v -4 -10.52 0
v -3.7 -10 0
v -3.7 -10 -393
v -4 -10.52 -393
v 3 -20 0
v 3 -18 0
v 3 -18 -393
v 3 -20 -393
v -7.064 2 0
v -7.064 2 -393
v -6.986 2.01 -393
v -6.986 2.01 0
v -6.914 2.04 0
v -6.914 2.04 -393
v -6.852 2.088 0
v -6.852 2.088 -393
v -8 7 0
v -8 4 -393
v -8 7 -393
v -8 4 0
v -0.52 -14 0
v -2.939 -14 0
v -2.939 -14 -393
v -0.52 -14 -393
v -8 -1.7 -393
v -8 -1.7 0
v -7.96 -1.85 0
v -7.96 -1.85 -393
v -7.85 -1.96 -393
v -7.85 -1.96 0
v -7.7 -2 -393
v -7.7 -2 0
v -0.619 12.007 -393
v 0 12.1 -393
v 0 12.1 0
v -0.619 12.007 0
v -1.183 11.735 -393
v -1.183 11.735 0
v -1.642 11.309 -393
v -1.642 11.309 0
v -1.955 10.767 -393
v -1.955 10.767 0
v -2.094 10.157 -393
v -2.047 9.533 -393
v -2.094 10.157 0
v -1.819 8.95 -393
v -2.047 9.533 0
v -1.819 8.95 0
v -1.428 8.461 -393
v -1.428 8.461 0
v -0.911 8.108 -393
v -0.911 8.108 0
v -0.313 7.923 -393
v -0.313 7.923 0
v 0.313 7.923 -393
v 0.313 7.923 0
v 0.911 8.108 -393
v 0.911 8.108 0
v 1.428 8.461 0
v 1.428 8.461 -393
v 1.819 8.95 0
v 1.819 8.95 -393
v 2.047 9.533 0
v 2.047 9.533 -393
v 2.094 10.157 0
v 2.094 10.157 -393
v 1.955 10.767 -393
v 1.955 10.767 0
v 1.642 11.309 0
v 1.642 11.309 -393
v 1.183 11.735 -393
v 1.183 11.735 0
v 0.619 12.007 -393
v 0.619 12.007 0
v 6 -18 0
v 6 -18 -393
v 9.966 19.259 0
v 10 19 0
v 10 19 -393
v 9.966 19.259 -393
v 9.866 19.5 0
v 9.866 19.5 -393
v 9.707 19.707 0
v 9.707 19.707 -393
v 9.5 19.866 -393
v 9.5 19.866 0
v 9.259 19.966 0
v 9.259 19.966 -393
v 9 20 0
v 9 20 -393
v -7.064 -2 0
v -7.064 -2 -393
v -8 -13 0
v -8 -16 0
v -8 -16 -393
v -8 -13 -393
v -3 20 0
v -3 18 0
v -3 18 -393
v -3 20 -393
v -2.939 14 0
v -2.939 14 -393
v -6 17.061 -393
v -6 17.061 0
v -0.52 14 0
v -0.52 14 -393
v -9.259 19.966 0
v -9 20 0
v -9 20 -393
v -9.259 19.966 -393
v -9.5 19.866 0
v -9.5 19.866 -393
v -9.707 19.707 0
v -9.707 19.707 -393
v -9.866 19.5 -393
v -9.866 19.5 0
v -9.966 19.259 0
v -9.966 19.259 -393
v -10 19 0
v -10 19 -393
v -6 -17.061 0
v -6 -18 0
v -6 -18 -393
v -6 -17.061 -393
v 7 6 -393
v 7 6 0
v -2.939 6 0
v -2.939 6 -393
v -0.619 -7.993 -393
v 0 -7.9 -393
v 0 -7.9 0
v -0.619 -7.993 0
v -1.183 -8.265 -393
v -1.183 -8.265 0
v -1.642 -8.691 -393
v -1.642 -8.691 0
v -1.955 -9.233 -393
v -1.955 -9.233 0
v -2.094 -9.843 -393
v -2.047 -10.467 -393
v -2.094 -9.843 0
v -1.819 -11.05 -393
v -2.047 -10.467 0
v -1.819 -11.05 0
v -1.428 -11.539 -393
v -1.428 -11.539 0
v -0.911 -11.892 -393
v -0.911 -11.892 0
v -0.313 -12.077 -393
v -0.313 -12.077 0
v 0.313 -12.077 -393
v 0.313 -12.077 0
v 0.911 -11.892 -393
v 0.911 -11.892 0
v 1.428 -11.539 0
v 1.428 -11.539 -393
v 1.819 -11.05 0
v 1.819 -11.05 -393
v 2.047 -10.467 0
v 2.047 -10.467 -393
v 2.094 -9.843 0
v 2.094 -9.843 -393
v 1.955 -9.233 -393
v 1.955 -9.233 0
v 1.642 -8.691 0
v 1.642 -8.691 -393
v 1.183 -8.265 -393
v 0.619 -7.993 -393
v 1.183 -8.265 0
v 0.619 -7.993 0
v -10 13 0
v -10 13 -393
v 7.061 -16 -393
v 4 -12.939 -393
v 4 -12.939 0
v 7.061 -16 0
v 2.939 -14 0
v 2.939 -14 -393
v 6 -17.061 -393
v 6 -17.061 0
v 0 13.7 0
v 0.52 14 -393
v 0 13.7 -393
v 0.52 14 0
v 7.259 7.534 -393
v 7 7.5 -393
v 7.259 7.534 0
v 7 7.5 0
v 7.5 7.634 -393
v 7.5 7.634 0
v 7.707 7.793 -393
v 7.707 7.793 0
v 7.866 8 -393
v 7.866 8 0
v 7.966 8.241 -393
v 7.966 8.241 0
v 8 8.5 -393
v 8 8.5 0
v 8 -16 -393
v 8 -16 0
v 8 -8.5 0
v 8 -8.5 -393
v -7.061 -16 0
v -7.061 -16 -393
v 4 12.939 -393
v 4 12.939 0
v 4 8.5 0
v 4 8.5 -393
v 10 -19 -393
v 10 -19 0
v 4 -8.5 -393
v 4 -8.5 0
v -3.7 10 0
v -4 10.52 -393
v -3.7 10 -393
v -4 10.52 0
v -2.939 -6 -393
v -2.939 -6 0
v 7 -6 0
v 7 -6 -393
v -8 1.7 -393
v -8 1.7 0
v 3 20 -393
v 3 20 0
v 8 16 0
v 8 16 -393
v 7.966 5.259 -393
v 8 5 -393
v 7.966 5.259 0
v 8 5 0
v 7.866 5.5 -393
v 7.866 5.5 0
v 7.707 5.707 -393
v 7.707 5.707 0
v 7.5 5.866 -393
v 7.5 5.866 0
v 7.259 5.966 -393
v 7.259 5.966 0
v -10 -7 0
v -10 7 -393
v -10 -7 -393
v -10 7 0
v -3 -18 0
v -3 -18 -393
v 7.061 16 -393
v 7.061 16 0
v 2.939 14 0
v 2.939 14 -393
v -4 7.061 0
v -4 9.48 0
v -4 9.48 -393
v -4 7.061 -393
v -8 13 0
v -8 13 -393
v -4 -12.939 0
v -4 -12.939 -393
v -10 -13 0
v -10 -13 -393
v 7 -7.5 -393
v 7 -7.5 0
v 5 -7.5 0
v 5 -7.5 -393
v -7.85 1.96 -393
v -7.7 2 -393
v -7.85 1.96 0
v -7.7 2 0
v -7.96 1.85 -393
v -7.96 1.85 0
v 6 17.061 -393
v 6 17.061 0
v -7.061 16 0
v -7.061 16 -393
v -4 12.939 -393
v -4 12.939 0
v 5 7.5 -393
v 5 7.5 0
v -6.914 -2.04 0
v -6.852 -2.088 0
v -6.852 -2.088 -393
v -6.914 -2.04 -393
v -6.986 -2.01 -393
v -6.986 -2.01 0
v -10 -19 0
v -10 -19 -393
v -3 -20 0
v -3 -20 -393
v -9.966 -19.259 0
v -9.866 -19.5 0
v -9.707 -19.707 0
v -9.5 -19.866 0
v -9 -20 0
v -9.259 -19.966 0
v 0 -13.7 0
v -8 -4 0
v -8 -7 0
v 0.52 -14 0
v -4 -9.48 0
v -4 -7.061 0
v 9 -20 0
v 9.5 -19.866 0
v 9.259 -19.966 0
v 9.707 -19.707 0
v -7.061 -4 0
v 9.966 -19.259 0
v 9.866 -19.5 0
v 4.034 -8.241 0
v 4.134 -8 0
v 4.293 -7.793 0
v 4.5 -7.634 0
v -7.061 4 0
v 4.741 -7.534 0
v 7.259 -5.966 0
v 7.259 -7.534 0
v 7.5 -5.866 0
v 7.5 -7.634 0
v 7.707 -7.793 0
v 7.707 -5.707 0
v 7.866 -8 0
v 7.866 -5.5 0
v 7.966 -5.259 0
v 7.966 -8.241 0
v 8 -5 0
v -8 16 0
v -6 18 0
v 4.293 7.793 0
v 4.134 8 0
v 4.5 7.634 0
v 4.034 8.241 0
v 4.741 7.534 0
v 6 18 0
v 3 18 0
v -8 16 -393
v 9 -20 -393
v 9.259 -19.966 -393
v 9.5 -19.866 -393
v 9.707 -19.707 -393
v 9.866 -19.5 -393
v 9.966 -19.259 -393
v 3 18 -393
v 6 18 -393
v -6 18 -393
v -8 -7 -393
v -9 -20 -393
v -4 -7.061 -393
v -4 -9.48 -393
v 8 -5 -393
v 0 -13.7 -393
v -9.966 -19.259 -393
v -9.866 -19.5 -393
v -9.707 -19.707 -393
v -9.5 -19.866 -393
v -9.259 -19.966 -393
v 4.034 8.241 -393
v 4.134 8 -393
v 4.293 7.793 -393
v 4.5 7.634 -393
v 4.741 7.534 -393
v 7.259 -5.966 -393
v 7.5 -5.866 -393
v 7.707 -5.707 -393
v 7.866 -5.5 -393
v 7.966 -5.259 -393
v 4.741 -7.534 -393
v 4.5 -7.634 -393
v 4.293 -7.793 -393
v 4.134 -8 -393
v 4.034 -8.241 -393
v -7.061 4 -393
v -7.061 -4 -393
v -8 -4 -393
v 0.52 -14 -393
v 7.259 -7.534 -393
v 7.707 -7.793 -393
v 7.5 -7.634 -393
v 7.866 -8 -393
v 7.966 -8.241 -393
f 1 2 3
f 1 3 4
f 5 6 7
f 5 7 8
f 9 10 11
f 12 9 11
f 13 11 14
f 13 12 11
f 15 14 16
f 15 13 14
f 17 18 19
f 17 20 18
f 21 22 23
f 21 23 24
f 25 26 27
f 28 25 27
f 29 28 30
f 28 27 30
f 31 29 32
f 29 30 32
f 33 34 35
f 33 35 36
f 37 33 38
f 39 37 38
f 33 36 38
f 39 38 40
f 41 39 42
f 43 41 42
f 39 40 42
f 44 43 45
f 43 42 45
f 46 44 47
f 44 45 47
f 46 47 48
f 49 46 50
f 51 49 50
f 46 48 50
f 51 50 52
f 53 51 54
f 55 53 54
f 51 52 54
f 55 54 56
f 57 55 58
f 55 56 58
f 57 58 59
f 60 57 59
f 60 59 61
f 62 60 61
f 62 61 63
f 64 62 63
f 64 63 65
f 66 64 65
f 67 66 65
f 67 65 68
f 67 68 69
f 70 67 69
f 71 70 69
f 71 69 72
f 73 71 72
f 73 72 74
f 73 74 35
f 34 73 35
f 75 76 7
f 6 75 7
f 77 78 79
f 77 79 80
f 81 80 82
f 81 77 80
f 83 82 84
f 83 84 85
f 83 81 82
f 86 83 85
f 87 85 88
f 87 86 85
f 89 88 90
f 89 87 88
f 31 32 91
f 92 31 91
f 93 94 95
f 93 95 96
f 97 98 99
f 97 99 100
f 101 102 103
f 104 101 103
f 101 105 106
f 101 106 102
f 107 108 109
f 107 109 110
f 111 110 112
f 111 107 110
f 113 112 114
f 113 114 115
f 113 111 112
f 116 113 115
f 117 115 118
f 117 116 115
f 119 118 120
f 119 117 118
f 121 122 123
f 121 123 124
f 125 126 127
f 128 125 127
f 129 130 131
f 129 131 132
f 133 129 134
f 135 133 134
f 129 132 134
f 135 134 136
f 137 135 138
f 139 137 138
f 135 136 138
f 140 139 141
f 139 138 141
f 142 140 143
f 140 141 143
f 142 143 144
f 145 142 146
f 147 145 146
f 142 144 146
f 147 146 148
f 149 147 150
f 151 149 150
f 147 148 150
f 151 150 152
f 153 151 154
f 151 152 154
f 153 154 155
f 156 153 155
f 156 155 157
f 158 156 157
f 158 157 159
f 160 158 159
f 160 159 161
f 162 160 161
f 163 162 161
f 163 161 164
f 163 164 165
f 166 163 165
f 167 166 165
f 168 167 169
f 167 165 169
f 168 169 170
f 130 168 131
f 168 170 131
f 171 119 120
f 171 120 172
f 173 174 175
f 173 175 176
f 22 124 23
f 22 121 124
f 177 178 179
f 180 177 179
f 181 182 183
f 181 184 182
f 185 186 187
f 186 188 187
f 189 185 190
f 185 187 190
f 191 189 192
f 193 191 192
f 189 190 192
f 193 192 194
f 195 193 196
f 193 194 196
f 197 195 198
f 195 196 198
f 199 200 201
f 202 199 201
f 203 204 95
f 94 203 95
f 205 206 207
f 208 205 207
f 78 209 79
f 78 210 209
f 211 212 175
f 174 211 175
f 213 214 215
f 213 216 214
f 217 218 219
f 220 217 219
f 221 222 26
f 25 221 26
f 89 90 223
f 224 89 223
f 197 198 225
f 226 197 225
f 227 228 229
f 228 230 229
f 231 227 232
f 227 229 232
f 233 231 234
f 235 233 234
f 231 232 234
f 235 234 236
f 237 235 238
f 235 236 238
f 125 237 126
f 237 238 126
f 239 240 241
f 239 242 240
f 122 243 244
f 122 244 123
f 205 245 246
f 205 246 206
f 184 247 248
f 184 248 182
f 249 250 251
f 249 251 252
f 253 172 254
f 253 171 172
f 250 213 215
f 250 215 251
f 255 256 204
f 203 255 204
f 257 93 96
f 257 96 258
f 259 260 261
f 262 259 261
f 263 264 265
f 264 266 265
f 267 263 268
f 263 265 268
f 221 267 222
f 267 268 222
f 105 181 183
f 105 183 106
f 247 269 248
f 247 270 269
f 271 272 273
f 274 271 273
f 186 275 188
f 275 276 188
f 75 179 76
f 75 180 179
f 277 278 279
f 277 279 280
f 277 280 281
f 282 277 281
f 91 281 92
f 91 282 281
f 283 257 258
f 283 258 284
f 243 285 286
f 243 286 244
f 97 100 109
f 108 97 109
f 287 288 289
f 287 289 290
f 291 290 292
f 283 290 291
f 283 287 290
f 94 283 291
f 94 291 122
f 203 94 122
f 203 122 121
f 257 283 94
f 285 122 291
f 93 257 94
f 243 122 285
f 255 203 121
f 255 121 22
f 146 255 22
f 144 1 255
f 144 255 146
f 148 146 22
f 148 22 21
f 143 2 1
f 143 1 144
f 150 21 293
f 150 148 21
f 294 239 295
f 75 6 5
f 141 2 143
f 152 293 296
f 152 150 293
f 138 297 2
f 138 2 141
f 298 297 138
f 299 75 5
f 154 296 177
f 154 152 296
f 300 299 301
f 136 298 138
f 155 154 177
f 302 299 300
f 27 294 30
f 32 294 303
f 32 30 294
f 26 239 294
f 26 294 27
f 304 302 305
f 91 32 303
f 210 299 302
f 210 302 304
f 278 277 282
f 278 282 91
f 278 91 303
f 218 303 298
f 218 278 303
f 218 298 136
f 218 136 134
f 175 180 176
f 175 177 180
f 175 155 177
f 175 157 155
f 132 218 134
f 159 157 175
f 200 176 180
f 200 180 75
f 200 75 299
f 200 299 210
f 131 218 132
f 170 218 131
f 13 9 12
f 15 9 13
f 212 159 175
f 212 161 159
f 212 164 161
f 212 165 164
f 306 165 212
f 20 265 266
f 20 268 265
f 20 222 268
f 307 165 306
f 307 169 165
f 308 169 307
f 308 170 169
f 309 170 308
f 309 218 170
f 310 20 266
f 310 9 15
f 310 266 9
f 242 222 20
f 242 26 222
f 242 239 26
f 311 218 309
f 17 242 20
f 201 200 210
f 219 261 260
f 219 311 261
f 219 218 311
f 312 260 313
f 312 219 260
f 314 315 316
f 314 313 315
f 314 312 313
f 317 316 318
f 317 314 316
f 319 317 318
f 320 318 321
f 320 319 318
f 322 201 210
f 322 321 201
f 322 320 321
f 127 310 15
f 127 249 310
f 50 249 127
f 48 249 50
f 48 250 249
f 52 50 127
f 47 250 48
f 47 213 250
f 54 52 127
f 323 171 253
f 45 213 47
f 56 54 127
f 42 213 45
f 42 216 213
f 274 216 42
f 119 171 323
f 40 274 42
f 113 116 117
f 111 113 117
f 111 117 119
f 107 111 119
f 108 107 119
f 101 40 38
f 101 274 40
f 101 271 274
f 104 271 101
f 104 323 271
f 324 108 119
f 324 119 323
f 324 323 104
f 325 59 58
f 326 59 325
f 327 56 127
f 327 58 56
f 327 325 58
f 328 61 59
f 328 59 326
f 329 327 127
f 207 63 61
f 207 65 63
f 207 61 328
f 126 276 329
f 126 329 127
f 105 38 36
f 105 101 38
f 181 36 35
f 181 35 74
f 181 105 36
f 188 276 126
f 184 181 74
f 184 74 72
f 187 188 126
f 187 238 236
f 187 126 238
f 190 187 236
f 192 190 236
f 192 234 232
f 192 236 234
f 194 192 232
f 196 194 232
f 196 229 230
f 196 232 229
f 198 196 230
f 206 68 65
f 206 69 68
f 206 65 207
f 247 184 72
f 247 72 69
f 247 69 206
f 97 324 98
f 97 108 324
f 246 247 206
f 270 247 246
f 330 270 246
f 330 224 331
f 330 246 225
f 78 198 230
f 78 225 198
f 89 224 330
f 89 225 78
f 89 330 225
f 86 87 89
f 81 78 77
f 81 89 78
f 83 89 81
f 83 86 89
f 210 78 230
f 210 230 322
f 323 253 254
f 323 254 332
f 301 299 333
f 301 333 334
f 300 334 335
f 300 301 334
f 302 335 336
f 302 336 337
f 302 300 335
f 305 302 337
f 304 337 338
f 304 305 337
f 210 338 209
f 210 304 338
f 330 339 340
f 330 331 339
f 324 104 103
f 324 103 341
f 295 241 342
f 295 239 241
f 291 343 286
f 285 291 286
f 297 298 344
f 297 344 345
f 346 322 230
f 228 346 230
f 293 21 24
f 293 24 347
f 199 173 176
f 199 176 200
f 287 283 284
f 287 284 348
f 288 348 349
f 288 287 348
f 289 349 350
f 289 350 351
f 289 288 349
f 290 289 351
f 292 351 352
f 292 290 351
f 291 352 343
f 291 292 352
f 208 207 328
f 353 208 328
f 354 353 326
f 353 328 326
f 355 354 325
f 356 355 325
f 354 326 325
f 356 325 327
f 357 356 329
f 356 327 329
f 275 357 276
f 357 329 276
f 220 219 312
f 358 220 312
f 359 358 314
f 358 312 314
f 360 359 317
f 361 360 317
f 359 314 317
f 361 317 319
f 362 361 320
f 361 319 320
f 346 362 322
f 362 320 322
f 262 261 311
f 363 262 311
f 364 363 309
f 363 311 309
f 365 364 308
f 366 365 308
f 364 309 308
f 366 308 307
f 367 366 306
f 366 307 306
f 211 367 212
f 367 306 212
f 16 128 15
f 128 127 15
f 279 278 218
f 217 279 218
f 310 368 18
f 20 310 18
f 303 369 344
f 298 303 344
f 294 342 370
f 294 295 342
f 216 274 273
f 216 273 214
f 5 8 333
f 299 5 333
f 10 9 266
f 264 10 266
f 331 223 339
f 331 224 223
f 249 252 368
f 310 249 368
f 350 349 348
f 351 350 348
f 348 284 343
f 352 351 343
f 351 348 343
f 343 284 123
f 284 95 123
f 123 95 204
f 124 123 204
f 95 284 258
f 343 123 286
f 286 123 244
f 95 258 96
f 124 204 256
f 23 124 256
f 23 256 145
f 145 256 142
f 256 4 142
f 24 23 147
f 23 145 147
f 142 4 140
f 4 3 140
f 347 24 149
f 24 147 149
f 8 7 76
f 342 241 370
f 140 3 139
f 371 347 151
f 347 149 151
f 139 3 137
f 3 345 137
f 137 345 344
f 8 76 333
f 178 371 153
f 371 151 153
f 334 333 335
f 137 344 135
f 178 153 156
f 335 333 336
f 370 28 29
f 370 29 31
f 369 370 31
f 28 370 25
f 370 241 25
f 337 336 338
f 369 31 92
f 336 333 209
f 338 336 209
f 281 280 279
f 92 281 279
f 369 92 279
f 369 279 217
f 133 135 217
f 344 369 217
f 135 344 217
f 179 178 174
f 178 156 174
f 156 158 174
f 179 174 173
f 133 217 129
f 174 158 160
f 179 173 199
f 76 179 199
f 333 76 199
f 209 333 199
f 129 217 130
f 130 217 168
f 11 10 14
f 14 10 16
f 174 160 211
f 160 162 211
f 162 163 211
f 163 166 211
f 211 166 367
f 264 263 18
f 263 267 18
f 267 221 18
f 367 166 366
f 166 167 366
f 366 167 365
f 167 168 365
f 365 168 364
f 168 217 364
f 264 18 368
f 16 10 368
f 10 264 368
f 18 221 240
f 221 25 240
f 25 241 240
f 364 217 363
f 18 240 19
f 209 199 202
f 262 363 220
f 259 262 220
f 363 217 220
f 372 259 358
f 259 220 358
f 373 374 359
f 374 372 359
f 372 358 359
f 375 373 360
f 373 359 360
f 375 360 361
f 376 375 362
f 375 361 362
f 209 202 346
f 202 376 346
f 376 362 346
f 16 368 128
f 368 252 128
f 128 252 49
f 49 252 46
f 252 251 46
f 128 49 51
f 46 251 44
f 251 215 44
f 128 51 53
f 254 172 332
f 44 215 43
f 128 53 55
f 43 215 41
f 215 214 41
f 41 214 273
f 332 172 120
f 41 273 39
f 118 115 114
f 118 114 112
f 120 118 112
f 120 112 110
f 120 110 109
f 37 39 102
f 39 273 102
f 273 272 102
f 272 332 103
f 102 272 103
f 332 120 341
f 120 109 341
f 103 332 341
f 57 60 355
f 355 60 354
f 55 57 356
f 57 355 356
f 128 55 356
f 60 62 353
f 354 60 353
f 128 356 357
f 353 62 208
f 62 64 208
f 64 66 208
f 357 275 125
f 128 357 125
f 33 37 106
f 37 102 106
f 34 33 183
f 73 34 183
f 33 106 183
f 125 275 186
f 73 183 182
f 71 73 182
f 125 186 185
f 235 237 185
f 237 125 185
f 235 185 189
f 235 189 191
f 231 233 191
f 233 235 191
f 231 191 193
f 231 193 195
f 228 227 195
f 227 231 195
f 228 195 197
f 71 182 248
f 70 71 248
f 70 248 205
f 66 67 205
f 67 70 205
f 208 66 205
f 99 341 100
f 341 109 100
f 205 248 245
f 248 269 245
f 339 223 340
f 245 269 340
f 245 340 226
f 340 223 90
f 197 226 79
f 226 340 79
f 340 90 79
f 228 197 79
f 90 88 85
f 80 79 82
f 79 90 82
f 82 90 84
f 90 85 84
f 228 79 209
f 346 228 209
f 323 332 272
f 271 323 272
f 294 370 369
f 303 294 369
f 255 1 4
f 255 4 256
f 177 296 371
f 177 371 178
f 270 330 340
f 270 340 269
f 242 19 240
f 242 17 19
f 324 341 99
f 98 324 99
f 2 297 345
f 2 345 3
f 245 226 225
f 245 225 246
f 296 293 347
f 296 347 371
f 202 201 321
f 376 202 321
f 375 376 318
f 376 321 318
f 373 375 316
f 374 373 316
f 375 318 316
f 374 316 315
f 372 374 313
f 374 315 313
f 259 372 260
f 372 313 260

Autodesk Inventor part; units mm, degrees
sketch "Sketch_63" plane through (0, 0, 0) normal (0, 0, 1) x (1, 0, 0)
  line L0 (-10, -7) -> (-8, -7)
  line L1 (-8, -7) -> (-8, -4)
  line L2 (-8, -4) -> (-7.0607, -4)
  line L3 (-7.0607, -4) -> (-4, -7.0607)
  line L4 (-4, -7.0607) -> (-4, -9.4804)
  line L5 (-4, -9.4804) -> (-3.7, -10)
  line L6 (-3.7, -10) -> (-4, -10.5196)
  line L7 (-4, -10.5196) -> (-4, -12.9393)
  line L8 (-4, -12.9393) -> (-7.0607, -16)
  line L9 (-7.0607, -16) -> (-8, -16)
  line L10 (-8, -16) -> (-8, -13)
  line L11 (-8, -13) -> (-10, -13)
  line L12 (-10, -13) -> (-10, -19)
  arc A0 (-10, -19) -> (-9, -20) centre (-9, -19) ccw
  line L13 (-9, -20) -> (-3, -20)
  line L14 (-3, -20) -> (-3, -18)
  line L15 (-3, -18) -> (-6, -18)
  line L16 (-6, -18) -> (-6, -17.0607)
  line L17 (-6, -17.0607) -> (-2.9393, -14)
  line L18 (-2.9393, -14) -> (-0.5196, -14)
  line L19 (-0.5196, -14) -> (0, -13.7)
  line L20 (0, -13.7) -> (0.5196, -14)
  line L21 (0.5196, -14) -> (2.9393, -14)
  line L22 (2.9393, -14) -> (6, -17.0607)
  line L23 (6, -17.0607) -> (6, -18)
  line L24 (6, -18) -> (3, -18)
  line L25 (3, -18) -> (3, -20)
  line L26 (3, -20) -> (9, -20)
  arc A1 (9, -20) -> (10, -19) centre (9, -19) ccw
  line L27 (10, -19) -> (10, 19)
  arc A2 (10, 19) -> (9, 20) centre (9, 19) ccw
  line L28 (9, 20) -> (3, 20)
  line L29 (3, 20) -> (3, 18)
  line L30 (3, 18) -> (6, 18)
  line L31 (6, 18) -> (6, 17.0607)
  line L32 (6, 17.0607) -> (2.9393, 14)
  line L33 (2.9393, 14) -> (0.5196, 14)
  line L34 (0.5196, 14) -> (0, 13.7)
  line L35 (0, 13.7) -> (-0.5196, 14)
  line L36 (-0.5196, 14) -> (-2.9393, 14)
  line L37 (-2.9393, 14) -> (-6, 17.0607)
  line L38 (-6, 17.0607) -> (-6, 18)
  line L39 (-6, 18) -> (-3, 18)
  line L40 (-3, 18) -> (-3, 20)
  line L41 (-3, 20) -> (-9, 20)
  arc A3 (-9, 20) -> (-10, 19) centre (-9, 19) ccw
  line L42 (-10, 19) -> (-10, 13)
  line L43 (-10, 13) -> (-8, 13)
  line L44 (-8, 13) -> (-8, 16)
  line L45 (-8, 16) -> (-7.0607, 16)
  line L46 (-7.0607, 16) -> (-4, 12.9393)
  line L47 (-4, 12.9393) -> (-4, 10.5196)
  line L48 (-4, 10.5196) -> (-3.7, 10)
  line L49 (-3.7, 10) -> (-4, 9.4804)
  line L50 (-4, 9.4804) -> (-4, 7.0607)
  line L51 (-4, 7.0607) -> (-7.0607, 4)
  line L52 (-7.0607, 4) -> (-8, 4)
  line L53 (-8, 4) -> (-8, 7)
  line L54 (-8, 7) -> (-10, 7)
  line L55 (-10, 7) -> (-10, -7)
  line L56 (4, 12.9393) -> (4, 8.5)
  arc A4 (4, 8.5) -> (5, 7.5) centre (5, 8.5) ccw
  line L57 (5, 7.5) -> (7, 7.5)
  arc A5 (7, 7.5) -> (8, 8.5) centre (7, 8.5) ccw
  line L58 (8, 8.5) -> (8, 16)
  line L59 (8, 16) -> (7.0607, 16)
  line L60 (7.0607, 16) -> (4, 12.9393)
  line L61 (4, -12.9393) -> (7.0607, -16)
  line L62 (7.0607, -16) -> (8, -16)
  line L63 (8, -16) -> (8, -8.5)
  arc A6 (8, -8.5) -> (7, -7.5) centre (7, -8.5) ccw
  line L64 (7, -7.5) -> (5, -7.5)
  arc A7 (5, -7.5) -> (4, -8.5) centre (5, -8.5) ccw
  line L65 (4, -8.5) -> (4, -12.9393)
  line L66 (-8, 1.7) -> (-8, -1.7)
  arc A8 (-8, -1.7) -> (-7.7, -2) centre (-7.7, -1.7) ccw
  line L67 (-7.7, -2) -> (-7.0636, -2)
  arc A9 (-6.8515, -2.0879) -> (-7.0636, -2) centre (-7.0636, -2.3) ccw
  line L68 (-6.8515, -2.0879) -> (-2.9393, -6)
  line L69 (-2.9393, -6) -> (7, -6)
  arc A10 (7, -6) -> (8, -5) centre (7, -5) ccw
  line L70 (8, -5) -> (8, 5)
  arc A11 (8, 5) -> (7, 6) centre (7, 5) ccw
  line L71 (7, 6) -> (-2.9393, 6)
  line L72 (-2.9393, 6) -> (-6.8515, 2.0879)
  arc A12 (-7.0636, 2) -> (-6.8515, 2.0879) centre (-7.0636, 2.3) ccw
  line L73 (-7.0636, 2) -> (-7.7, 2)
  arc A13 (-7.7, 2) -> (-8, 1.7) centre (-7.7, 1.7) ccw
extrude "Extrusion1" add sketch "Sketch_63" against normal blind 393
sketch "Sketch2" plane through (0, 0, -393) normal (0, 0, -1) x (-1, 0, 0)
  point P0 (0, 10)
hole "Hole1" at (0, 10, -393) direction (0, 0, 1) diameter 4.2 end through all
pattern_linear "Rectangular Pattern1" count 2 spacing 20 along (0, -1, 0) of "Hole1"
ref_plane "C1_XY" through (0, 0, 0) normal (0, 0, 1) x (1, 0, 0)
ref_plane "C1_YZ" through (0, 0, 0) normal (1, 0, 0) x (0, 1, 0)
ref_plane "C1_ZX" through (0, 0, 0) normal (0, 1, 0) x (0, 0, 1)
thread "Thread1" size "M5x0.8" class "6H" standard "ANSI Metric M Profile" length 10
thread "Thread2" size "M5x0.8" class "6H" standard "ANSI Metric M Profile" length 10
thread "Thread3" size "M5x0.8" class "6H" standard "ANSI Metric M Profile" length 10
thread "Thread4" size "M4.5x0.75" class "6H" standard "ANSI Metric M Profile" length 10
properties part number "HFSF5-2040-393" material "Aluminum 6061"
